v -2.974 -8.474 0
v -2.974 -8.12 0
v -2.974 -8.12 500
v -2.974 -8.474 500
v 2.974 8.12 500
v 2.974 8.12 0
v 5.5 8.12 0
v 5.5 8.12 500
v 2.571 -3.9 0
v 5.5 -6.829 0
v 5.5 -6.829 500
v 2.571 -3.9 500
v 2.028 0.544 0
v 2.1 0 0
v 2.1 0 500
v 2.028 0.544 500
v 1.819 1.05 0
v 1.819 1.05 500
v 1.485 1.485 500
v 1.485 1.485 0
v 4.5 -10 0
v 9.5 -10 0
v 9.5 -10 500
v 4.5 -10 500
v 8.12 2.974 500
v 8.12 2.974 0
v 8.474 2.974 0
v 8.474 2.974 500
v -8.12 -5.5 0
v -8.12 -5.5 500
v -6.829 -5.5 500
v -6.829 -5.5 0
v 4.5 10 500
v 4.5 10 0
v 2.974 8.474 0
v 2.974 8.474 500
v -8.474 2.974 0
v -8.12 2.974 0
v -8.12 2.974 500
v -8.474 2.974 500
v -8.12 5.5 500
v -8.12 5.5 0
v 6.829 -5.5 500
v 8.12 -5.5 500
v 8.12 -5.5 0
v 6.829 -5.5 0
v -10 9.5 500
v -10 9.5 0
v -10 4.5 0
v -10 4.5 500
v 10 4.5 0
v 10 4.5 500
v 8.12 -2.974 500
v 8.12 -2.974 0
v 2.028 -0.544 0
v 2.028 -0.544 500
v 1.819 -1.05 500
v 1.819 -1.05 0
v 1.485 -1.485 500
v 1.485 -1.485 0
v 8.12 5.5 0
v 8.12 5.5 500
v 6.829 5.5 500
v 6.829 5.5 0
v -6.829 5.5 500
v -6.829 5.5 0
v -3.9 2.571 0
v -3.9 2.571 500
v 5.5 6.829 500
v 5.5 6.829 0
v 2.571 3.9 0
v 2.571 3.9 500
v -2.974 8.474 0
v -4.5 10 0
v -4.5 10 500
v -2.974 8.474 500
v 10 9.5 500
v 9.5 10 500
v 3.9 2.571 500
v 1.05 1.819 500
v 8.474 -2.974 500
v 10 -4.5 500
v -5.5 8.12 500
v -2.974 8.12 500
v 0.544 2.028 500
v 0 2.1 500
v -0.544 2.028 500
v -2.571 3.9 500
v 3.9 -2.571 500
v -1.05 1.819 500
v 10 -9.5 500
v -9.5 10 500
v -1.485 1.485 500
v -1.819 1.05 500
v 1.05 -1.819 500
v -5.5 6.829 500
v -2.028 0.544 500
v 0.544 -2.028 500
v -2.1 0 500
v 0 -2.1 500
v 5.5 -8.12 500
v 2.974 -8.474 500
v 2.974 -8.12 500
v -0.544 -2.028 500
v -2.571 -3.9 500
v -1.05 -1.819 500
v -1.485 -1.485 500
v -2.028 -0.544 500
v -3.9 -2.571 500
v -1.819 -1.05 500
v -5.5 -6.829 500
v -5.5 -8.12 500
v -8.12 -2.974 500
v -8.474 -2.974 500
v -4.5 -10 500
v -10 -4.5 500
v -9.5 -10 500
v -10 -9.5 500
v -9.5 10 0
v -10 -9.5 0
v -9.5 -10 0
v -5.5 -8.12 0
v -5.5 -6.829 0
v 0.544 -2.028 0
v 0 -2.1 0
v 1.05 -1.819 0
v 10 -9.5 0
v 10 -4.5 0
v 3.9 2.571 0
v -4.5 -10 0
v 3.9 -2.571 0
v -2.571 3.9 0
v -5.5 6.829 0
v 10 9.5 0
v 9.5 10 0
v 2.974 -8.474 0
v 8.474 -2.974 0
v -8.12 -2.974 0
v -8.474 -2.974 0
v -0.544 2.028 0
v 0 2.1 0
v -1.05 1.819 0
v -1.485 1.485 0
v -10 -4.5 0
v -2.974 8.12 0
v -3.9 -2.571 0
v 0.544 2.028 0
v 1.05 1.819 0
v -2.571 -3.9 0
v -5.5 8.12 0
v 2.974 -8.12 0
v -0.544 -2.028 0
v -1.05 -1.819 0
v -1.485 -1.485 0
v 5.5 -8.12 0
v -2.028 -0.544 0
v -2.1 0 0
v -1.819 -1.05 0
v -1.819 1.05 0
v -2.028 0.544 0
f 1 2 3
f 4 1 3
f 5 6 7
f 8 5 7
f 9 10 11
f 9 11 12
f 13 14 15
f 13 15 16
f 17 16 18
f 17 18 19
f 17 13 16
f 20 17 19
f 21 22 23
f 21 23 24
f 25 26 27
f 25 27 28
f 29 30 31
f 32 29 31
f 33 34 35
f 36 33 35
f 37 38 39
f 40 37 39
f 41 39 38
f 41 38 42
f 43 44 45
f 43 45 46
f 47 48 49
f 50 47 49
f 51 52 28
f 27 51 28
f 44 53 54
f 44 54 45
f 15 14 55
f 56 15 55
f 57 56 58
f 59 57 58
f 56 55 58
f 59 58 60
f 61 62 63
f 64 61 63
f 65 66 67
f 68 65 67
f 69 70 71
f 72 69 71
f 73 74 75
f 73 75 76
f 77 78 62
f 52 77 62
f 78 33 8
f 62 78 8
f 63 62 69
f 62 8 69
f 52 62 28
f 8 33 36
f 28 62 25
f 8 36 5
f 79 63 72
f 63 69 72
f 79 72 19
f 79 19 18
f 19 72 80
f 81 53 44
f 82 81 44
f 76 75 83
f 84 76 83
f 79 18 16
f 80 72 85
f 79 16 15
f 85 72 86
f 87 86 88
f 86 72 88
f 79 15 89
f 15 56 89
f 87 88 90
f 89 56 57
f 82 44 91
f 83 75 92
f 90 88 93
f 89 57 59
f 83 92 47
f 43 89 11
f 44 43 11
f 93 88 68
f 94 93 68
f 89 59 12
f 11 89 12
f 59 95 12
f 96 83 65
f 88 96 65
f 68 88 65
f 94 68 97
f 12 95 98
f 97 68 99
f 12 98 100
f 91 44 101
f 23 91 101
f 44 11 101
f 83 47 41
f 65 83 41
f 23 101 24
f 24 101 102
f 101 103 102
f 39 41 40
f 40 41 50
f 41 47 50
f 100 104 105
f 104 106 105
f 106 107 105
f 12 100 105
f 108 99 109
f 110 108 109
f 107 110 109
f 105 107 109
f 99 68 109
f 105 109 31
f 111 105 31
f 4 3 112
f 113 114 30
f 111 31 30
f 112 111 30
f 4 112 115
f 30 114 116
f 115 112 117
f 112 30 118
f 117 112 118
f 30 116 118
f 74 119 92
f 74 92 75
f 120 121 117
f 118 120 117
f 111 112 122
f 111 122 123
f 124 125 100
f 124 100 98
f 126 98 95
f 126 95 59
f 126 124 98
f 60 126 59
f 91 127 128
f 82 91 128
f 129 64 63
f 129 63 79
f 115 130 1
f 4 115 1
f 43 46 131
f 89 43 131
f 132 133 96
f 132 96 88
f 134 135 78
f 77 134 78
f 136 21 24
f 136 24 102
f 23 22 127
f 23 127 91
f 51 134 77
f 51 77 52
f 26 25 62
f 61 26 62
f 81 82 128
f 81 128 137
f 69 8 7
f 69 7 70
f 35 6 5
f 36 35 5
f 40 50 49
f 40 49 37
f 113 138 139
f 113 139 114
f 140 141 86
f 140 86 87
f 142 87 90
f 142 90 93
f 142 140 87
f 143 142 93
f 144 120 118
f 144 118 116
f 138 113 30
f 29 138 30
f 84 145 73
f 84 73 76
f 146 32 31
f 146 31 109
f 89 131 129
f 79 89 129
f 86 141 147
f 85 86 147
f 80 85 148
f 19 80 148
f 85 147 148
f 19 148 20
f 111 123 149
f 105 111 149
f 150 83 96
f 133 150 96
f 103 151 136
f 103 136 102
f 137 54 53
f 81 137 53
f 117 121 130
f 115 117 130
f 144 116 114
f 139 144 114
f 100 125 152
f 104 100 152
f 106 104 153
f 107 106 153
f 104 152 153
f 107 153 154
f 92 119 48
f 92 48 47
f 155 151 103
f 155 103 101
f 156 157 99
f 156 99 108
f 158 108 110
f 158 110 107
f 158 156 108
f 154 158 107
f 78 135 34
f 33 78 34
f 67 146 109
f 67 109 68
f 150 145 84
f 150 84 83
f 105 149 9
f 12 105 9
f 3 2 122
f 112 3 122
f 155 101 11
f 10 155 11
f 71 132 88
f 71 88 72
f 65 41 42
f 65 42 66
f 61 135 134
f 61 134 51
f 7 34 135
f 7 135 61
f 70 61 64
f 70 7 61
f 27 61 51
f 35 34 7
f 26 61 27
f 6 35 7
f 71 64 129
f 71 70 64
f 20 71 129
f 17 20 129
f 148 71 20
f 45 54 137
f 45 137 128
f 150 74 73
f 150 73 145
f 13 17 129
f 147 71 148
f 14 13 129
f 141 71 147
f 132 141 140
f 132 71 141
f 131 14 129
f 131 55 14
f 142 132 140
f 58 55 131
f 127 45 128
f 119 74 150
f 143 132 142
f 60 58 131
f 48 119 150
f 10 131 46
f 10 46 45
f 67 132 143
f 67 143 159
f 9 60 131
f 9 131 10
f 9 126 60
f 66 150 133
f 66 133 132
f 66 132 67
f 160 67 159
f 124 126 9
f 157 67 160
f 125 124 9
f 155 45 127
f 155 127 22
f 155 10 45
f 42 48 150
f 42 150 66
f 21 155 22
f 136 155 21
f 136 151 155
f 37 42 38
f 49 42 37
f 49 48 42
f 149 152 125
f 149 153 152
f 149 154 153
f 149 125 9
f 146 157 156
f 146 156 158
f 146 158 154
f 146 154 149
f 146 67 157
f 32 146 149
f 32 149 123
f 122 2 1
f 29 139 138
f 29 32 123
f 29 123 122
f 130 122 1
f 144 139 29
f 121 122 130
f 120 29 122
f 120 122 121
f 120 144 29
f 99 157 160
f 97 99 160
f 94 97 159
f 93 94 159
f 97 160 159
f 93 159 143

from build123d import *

# Parameters (mm, degrees)
BOSS_EXTRUDE1_DEPTH = 500
CHAMFER2_SIZE       = 0.5
CHAMFER2_SIZE2      = 0.353553391
CHAMFER1_SIZE       = 0.5


with BuildPart() as part:
    # Sketch1 → Boss-Extrude1 (new body)
    with BuildSketch(Plane.XY):
        with BuildLine():
            Line((5.5, 6.829360749), (2.570639251, 3.9))
            Line((2.570639251, 3.9), (0, 3.9))
            Line((0, 3.9), (0, 2.1))
            ThreePointArc((0, 2.1), (0.803635208, 1.940147018), (1.48492424, 1.48492424))
            Line((1.48492424, 1.48492424), (10, 10))
            Line((10, 10), (4.5, 10))
            Line((4.5, 10), (2.62, 8.12))
            Line((2.62, 8.12), (5.5, 8.12))
            Line((5.5, 8.12), (5.5, 6.829360749))
        make_face()
    extrude(amount=BOSS_EXTRUDE1_DEPTH)

    # Chamfer2
    chamfer2_edges = [part.edges().sort_by_distance(p)[0] for p in [
        (2.62, 8.12, 250),
    ]]
    chamfer2_side = [part.faces().sort_by_distance(p)[0] for p in [
        (3.56, 9.06, 250),
    ]]
    chamfer(chamfer2_edges, length=CHAMFER2_SIZE, length2=CHAMFER2_SIZE2, reference=chamfer2_side[0])

    # Mirror1: part across plane


with BuildPart() as part_1:
    add(part.part)
    add(part.part.mirror(Plane(origin=(10, 10, 500), x_dir=(0, 0, 1), z_dir=(-0.707106781186544, 0.7071067811865511, 0))))

    # Chamfer1
    chamfer1_edges = [part_1.edges().sort_by_distance(p)[0] for p in [
        (10, 10, 250),
    ]]
    chamfer(chamfer1_edges, length=CHAMFER1_SIZE)

    # Mirror4: part across plane


with BuildPart() as part_2:
    add(part_1.part)
    add(part_1.part.mirror(Plane(origin=(0, 3.9, 500), x_dir=(0, 0, 1), z_dir=(1, 0, 0))))

    # Mirror5: part across plane


with BuildPart() as part_3:
    add(part_2.part)
    add(part_2.part.mirror(Plane(origin=(-3.9, 0, 500), x_dir=(0, 0, 1), z_dir=(0, 1, 0))))


solid = part_3.part
